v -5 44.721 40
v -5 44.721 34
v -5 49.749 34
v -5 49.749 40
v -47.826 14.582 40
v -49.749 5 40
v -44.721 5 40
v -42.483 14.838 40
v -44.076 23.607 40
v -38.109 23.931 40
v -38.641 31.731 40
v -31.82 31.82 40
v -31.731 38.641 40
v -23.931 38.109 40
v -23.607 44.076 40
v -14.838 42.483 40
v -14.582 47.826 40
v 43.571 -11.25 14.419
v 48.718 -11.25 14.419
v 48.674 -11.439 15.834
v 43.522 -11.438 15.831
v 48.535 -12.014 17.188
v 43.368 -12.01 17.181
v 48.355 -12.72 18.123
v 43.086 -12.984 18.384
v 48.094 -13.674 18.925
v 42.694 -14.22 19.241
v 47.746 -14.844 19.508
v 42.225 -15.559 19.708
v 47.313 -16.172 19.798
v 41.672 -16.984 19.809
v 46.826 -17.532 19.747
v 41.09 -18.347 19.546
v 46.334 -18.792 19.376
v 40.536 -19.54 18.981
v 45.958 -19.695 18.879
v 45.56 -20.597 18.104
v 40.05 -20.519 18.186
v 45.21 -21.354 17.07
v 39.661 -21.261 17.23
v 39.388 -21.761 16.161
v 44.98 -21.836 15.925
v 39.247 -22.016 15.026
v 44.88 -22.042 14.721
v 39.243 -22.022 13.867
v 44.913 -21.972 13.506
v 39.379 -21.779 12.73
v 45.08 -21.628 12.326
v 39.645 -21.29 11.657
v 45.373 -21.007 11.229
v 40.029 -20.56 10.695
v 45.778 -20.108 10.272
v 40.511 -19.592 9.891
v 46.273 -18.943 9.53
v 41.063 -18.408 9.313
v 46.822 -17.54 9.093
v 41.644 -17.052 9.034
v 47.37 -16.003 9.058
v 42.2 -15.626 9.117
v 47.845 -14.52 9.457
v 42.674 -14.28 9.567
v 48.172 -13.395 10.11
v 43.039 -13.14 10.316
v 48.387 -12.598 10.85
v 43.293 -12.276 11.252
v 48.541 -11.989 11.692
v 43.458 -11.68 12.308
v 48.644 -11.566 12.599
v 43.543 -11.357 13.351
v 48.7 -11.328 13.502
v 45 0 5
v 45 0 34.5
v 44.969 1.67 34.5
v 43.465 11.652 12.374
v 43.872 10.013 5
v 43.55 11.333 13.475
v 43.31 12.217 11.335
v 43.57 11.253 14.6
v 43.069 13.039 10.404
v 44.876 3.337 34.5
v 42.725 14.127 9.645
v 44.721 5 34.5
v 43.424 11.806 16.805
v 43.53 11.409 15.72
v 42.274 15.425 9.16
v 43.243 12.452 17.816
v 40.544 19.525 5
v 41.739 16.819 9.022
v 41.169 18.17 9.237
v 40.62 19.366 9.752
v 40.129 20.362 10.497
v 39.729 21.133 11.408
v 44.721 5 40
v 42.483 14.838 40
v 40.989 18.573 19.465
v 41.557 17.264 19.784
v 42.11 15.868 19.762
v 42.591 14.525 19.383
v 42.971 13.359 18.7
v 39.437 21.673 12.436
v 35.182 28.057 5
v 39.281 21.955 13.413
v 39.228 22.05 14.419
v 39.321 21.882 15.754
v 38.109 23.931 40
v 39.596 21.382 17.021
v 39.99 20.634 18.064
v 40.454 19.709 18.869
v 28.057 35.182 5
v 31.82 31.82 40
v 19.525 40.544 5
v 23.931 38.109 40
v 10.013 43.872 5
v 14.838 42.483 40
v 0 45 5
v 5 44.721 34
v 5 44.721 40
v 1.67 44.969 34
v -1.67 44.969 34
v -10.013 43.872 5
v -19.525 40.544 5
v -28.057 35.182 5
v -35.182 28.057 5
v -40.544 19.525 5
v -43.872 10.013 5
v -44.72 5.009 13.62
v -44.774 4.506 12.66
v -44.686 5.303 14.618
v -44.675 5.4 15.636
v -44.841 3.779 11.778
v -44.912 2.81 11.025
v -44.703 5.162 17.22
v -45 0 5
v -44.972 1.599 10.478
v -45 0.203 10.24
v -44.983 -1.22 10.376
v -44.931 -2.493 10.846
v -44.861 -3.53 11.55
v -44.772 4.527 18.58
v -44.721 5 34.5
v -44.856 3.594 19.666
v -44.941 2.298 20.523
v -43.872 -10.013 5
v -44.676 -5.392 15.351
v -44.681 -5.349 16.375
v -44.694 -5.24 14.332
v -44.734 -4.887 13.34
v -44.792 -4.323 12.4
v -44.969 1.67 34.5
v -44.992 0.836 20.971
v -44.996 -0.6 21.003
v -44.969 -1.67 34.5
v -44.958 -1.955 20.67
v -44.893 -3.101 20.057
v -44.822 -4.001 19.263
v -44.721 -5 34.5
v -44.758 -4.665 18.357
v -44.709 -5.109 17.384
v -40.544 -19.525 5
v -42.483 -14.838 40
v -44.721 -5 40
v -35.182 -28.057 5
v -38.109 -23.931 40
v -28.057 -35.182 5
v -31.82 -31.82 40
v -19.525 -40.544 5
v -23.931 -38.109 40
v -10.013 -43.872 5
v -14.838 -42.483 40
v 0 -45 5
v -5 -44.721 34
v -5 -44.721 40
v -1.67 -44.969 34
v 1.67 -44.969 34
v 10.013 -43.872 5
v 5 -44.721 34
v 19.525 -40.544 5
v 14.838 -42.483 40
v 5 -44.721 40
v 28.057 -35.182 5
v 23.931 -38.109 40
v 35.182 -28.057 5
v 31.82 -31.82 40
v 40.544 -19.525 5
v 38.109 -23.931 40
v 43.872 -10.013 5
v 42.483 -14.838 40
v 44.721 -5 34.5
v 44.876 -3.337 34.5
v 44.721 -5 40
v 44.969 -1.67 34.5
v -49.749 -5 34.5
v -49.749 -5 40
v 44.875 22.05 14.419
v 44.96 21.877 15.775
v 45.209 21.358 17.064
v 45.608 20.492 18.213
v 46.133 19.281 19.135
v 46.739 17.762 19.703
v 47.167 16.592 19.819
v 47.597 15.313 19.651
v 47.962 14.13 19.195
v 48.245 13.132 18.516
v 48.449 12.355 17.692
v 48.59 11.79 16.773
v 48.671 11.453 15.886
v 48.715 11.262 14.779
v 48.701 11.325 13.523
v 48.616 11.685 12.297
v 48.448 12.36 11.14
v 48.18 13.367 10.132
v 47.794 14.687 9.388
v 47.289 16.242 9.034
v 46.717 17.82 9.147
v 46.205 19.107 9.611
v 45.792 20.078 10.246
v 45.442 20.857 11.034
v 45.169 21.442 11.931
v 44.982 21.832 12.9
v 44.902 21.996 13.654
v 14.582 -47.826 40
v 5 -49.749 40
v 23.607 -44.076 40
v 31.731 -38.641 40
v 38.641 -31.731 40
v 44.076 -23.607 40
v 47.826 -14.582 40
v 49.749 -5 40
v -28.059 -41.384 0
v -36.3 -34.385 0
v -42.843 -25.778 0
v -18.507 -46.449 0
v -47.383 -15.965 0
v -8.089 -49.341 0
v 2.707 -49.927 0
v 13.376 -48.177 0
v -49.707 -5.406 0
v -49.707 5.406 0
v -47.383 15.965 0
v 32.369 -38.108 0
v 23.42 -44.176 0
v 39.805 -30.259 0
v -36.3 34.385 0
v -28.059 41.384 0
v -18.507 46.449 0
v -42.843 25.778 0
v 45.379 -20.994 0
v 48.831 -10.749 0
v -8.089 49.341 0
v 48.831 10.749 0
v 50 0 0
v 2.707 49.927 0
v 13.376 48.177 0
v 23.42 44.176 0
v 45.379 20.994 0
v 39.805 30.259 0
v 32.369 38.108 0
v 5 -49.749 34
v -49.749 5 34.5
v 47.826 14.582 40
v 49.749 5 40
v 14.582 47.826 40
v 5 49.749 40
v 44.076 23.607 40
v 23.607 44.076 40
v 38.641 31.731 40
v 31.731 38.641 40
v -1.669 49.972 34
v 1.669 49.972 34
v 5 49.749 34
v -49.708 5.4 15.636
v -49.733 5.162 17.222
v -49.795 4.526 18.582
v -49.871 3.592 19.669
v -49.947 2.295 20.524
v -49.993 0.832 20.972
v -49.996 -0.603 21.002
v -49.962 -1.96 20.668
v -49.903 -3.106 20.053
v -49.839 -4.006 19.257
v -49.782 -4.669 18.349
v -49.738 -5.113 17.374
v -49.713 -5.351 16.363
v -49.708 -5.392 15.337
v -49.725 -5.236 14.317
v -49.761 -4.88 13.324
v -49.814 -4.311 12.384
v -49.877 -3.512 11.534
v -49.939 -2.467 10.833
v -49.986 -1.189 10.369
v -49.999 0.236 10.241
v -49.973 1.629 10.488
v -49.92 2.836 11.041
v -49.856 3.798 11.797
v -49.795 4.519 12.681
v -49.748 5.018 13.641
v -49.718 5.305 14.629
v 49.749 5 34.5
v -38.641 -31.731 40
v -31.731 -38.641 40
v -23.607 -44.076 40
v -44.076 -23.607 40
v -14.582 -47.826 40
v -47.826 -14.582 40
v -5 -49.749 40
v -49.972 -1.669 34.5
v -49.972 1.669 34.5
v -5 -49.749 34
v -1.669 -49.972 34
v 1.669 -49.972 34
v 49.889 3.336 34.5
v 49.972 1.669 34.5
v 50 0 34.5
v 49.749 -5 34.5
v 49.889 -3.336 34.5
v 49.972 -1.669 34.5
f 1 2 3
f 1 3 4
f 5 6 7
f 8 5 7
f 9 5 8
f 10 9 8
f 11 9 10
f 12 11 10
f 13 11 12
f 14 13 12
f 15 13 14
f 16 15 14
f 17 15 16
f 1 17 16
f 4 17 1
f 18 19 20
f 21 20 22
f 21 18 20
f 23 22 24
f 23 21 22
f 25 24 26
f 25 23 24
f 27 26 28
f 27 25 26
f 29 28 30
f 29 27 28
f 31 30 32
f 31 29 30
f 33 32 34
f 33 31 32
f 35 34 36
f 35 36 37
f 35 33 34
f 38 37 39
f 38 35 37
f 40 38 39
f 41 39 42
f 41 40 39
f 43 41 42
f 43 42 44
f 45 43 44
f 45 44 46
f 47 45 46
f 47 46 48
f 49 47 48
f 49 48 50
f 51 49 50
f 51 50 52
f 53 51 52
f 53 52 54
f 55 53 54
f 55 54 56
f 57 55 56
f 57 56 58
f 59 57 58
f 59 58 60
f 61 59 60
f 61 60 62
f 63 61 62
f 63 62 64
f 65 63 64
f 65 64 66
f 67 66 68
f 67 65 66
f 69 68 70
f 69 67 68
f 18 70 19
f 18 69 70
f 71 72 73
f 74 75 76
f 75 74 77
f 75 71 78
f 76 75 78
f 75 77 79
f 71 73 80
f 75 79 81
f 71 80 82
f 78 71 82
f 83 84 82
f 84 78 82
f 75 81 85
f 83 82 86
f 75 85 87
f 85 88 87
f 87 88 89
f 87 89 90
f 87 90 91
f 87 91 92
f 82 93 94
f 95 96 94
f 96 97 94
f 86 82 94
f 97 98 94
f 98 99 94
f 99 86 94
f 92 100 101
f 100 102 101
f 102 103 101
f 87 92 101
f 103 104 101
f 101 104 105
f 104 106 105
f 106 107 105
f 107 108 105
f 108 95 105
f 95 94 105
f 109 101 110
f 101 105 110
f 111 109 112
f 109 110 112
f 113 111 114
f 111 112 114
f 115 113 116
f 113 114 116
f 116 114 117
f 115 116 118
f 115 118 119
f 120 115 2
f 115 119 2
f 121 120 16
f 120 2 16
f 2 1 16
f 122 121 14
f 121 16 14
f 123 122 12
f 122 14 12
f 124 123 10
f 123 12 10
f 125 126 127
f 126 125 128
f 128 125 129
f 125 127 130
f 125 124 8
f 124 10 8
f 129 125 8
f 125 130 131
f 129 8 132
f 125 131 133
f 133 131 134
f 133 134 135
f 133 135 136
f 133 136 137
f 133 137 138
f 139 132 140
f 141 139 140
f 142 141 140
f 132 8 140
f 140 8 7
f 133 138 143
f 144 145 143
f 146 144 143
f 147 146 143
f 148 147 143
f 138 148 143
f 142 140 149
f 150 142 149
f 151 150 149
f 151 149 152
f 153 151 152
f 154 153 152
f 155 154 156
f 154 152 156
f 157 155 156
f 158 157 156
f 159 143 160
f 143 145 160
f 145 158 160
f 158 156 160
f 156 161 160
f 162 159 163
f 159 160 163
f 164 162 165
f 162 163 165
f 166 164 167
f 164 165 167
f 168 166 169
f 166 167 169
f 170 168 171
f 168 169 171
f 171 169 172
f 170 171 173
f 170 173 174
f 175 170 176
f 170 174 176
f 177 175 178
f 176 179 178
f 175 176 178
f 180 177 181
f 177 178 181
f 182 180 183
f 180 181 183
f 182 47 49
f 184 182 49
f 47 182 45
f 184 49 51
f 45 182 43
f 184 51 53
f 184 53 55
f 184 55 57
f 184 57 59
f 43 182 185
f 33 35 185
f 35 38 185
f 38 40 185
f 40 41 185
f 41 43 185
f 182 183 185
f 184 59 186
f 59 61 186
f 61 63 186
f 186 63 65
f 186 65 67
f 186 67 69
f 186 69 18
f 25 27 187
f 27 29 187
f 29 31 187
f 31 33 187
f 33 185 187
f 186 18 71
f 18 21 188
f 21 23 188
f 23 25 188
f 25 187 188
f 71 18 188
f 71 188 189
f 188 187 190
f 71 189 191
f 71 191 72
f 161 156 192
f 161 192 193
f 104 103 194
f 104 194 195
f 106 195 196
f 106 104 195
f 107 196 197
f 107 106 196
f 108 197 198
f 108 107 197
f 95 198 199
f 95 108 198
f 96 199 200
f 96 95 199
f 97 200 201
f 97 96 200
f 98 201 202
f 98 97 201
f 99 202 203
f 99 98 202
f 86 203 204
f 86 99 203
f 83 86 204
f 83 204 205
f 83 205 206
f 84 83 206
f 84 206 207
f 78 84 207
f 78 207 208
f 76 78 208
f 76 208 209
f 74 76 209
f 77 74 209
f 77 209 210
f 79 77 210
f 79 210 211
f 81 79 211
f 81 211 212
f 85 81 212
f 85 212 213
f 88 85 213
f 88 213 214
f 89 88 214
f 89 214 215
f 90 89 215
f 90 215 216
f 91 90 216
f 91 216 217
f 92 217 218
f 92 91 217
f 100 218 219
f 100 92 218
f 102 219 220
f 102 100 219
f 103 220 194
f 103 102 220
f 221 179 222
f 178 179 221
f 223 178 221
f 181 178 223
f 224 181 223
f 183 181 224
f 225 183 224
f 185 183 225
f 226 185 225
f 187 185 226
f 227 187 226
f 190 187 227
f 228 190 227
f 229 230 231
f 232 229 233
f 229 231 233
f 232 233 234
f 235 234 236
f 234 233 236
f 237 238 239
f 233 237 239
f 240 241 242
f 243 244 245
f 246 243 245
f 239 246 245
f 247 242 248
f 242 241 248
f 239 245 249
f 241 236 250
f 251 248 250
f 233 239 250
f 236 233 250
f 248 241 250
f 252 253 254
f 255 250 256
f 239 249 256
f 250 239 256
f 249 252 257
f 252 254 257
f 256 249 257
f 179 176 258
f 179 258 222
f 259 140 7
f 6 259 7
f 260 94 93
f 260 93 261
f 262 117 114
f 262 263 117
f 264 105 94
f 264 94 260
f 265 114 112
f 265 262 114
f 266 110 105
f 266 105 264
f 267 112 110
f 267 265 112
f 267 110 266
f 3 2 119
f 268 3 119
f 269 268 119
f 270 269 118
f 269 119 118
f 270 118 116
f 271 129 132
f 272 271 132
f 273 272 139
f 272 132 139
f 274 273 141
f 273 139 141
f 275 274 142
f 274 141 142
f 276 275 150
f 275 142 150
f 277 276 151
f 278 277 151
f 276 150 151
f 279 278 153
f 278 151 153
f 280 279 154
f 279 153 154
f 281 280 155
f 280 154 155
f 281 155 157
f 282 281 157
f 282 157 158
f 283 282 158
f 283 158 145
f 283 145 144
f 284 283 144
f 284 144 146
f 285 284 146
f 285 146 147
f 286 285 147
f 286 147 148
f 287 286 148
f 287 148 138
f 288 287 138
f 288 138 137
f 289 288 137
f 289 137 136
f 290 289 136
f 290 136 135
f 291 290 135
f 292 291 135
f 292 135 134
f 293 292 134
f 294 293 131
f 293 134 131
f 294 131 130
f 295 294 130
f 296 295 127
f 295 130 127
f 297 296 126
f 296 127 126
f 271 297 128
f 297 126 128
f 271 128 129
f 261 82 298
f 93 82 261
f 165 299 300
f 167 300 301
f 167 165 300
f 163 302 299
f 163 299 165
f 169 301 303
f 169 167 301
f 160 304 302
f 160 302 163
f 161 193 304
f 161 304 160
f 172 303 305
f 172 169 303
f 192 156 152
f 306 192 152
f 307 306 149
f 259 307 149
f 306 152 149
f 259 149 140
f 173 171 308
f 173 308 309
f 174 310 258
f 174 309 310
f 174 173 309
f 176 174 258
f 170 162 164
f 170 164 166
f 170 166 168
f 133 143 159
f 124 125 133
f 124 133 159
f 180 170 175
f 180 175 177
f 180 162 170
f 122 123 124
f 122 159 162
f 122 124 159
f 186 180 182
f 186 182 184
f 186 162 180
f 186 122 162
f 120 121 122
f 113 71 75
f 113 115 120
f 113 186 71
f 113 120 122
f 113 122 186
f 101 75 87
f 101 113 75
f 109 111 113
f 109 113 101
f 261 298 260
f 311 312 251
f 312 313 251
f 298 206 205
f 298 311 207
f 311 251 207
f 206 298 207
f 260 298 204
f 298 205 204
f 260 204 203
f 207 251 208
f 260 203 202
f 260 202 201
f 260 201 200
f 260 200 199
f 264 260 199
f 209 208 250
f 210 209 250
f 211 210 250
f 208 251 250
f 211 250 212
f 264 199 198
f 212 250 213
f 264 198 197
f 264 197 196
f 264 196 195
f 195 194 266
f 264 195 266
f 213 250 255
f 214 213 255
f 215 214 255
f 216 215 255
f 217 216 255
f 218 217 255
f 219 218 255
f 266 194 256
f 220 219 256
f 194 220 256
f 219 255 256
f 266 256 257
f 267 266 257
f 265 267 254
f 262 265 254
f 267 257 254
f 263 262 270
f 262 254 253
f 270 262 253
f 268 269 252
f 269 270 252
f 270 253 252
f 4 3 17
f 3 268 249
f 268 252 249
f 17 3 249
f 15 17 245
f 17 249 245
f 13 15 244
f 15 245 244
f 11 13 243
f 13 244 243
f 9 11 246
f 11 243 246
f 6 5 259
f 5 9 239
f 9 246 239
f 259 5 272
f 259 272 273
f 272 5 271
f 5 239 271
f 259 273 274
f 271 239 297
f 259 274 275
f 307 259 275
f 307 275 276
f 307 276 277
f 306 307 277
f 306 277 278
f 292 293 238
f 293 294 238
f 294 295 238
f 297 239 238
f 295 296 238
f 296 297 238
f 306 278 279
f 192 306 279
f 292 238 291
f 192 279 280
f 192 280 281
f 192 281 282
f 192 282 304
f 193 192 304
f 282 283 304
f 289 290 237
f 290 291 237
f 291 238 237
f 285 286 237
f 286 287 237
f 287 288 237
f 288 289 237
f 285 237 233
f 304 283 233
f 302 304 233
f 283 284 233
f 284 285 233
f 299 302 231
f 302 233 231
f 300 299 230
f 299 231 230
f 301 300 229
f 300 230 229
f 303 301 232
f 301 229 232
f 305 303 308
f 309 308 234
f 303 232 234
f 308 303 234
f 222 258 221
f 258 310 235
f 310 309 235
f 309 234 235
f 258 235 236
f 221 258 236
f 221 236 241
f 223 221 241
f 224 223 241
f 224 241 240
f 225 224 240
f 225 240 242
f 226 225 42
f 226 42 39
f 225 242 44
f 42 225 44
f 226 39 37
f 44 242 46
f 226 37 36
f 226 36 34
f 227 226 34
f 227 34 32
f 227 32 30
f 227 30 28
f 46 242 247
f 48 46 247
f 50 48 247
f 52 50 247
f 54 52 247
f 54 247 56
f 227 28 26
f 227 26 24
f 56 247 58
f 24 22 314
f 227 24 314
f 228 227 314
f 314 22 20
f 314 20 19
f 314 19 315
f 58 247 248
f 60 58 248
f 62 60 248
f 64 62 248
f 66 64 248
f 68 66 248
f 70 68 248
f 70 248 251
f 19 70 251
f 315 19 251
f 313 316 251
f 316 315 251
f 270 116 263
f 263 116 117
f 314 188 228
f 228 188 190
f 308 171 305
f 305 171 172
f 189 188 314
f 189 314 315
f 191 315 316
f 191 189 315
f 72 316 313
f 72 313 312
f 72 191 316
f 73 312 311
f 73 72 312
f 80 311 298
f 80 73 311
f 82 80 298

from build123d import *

# Parameters (mm, degrees)
F0_R      = 50
F1_DEPTH  = 40
F2_R      = 45
F3_DEPTH  = 35
F4_W      = 10
F4_H      = 6
F5_DEPTH  = 50
F6_W      = 10
F6_H      = 6
F7_DEPTH  = 50
F8_W      = 10
F8_H      = 5.49967
F9_DEPTH  = 50
F10_W     = 10
F10_H     = 5.49967
F11_DEPTH = 50
F12_R     = 5.4
F13_DEPTH = 59
F14_R     = 5.4
F15_DEPTH = 55


with BuildPart() as f1:
    # F0 (on Top) → F1 (new body)
    with BuildSketch(Plane.XY):
        Circle(F0_R)
    extrude(amount=F1_DEPTH)

    # F2 (on face) → F3 (cut)
    with BuildSketch(Plane.XY.offset(40)):
        Circle(F2_R)
    extrude(amount=-F3_DEPTH, mode=Mode.SUBTRACT)

    # F4 (on Front) → F5 (cut)
    with BuildSketch(Plane.XZ):
        with Locations((0, 37)):
            Rectangle(F4_W, F4_H)
    extrude(amount=-F5_DEPTH, mode=Mode.SUBTRACT)

    # F6 (on Front) → F7 (cut)
    with BuildSketch(Plane.XZ):
        with Locations((0, 37)):
            Rectangle(F6_W, F6_H)
    extrude(amount=F7_DEPTH, mode=Mode.SUBTRACT)

    # F8 (on Right) → F9 (cut)
    with BuildSketch(Plane.YZ):
        with Locations((0, 37.250165)):
            Rectangle(F8_W, F8_H)
    extrude(amount=-F9_DEPTH, mode=Mode.SUBTRACT)

    # F10 (on Right) → F11 (cut)
    with BuildSketch(Plane.YZ):
        with Locations((0, 37.250165)):
            Rectangle(F10_W, F10_H)
    extrude(amount=F11_DEPTH, mode=Mode.SUBTRACT)

    # F12 (on Right) → F13 (cut)
    with BuildSketch(Plane.YZ):
        with Locations((-16.65, 14.419014)):
            Circle(F12_R)
        with Locations((16.65, 14.419014)):
            Circle(F12_R)
    extrude(amount=F13_DEPTH, mode=Mode.SUBTRACT)

    # F14 (on Right) → F15 (cut)
    with BuildSketch(Plane.YZ):
        with Locations((0, 15.636282)):
            Circle(F14_R)
    extrude(amount=-F15_DEPTH, mode=Mode.SUBTRACT)


solid = f1.part
